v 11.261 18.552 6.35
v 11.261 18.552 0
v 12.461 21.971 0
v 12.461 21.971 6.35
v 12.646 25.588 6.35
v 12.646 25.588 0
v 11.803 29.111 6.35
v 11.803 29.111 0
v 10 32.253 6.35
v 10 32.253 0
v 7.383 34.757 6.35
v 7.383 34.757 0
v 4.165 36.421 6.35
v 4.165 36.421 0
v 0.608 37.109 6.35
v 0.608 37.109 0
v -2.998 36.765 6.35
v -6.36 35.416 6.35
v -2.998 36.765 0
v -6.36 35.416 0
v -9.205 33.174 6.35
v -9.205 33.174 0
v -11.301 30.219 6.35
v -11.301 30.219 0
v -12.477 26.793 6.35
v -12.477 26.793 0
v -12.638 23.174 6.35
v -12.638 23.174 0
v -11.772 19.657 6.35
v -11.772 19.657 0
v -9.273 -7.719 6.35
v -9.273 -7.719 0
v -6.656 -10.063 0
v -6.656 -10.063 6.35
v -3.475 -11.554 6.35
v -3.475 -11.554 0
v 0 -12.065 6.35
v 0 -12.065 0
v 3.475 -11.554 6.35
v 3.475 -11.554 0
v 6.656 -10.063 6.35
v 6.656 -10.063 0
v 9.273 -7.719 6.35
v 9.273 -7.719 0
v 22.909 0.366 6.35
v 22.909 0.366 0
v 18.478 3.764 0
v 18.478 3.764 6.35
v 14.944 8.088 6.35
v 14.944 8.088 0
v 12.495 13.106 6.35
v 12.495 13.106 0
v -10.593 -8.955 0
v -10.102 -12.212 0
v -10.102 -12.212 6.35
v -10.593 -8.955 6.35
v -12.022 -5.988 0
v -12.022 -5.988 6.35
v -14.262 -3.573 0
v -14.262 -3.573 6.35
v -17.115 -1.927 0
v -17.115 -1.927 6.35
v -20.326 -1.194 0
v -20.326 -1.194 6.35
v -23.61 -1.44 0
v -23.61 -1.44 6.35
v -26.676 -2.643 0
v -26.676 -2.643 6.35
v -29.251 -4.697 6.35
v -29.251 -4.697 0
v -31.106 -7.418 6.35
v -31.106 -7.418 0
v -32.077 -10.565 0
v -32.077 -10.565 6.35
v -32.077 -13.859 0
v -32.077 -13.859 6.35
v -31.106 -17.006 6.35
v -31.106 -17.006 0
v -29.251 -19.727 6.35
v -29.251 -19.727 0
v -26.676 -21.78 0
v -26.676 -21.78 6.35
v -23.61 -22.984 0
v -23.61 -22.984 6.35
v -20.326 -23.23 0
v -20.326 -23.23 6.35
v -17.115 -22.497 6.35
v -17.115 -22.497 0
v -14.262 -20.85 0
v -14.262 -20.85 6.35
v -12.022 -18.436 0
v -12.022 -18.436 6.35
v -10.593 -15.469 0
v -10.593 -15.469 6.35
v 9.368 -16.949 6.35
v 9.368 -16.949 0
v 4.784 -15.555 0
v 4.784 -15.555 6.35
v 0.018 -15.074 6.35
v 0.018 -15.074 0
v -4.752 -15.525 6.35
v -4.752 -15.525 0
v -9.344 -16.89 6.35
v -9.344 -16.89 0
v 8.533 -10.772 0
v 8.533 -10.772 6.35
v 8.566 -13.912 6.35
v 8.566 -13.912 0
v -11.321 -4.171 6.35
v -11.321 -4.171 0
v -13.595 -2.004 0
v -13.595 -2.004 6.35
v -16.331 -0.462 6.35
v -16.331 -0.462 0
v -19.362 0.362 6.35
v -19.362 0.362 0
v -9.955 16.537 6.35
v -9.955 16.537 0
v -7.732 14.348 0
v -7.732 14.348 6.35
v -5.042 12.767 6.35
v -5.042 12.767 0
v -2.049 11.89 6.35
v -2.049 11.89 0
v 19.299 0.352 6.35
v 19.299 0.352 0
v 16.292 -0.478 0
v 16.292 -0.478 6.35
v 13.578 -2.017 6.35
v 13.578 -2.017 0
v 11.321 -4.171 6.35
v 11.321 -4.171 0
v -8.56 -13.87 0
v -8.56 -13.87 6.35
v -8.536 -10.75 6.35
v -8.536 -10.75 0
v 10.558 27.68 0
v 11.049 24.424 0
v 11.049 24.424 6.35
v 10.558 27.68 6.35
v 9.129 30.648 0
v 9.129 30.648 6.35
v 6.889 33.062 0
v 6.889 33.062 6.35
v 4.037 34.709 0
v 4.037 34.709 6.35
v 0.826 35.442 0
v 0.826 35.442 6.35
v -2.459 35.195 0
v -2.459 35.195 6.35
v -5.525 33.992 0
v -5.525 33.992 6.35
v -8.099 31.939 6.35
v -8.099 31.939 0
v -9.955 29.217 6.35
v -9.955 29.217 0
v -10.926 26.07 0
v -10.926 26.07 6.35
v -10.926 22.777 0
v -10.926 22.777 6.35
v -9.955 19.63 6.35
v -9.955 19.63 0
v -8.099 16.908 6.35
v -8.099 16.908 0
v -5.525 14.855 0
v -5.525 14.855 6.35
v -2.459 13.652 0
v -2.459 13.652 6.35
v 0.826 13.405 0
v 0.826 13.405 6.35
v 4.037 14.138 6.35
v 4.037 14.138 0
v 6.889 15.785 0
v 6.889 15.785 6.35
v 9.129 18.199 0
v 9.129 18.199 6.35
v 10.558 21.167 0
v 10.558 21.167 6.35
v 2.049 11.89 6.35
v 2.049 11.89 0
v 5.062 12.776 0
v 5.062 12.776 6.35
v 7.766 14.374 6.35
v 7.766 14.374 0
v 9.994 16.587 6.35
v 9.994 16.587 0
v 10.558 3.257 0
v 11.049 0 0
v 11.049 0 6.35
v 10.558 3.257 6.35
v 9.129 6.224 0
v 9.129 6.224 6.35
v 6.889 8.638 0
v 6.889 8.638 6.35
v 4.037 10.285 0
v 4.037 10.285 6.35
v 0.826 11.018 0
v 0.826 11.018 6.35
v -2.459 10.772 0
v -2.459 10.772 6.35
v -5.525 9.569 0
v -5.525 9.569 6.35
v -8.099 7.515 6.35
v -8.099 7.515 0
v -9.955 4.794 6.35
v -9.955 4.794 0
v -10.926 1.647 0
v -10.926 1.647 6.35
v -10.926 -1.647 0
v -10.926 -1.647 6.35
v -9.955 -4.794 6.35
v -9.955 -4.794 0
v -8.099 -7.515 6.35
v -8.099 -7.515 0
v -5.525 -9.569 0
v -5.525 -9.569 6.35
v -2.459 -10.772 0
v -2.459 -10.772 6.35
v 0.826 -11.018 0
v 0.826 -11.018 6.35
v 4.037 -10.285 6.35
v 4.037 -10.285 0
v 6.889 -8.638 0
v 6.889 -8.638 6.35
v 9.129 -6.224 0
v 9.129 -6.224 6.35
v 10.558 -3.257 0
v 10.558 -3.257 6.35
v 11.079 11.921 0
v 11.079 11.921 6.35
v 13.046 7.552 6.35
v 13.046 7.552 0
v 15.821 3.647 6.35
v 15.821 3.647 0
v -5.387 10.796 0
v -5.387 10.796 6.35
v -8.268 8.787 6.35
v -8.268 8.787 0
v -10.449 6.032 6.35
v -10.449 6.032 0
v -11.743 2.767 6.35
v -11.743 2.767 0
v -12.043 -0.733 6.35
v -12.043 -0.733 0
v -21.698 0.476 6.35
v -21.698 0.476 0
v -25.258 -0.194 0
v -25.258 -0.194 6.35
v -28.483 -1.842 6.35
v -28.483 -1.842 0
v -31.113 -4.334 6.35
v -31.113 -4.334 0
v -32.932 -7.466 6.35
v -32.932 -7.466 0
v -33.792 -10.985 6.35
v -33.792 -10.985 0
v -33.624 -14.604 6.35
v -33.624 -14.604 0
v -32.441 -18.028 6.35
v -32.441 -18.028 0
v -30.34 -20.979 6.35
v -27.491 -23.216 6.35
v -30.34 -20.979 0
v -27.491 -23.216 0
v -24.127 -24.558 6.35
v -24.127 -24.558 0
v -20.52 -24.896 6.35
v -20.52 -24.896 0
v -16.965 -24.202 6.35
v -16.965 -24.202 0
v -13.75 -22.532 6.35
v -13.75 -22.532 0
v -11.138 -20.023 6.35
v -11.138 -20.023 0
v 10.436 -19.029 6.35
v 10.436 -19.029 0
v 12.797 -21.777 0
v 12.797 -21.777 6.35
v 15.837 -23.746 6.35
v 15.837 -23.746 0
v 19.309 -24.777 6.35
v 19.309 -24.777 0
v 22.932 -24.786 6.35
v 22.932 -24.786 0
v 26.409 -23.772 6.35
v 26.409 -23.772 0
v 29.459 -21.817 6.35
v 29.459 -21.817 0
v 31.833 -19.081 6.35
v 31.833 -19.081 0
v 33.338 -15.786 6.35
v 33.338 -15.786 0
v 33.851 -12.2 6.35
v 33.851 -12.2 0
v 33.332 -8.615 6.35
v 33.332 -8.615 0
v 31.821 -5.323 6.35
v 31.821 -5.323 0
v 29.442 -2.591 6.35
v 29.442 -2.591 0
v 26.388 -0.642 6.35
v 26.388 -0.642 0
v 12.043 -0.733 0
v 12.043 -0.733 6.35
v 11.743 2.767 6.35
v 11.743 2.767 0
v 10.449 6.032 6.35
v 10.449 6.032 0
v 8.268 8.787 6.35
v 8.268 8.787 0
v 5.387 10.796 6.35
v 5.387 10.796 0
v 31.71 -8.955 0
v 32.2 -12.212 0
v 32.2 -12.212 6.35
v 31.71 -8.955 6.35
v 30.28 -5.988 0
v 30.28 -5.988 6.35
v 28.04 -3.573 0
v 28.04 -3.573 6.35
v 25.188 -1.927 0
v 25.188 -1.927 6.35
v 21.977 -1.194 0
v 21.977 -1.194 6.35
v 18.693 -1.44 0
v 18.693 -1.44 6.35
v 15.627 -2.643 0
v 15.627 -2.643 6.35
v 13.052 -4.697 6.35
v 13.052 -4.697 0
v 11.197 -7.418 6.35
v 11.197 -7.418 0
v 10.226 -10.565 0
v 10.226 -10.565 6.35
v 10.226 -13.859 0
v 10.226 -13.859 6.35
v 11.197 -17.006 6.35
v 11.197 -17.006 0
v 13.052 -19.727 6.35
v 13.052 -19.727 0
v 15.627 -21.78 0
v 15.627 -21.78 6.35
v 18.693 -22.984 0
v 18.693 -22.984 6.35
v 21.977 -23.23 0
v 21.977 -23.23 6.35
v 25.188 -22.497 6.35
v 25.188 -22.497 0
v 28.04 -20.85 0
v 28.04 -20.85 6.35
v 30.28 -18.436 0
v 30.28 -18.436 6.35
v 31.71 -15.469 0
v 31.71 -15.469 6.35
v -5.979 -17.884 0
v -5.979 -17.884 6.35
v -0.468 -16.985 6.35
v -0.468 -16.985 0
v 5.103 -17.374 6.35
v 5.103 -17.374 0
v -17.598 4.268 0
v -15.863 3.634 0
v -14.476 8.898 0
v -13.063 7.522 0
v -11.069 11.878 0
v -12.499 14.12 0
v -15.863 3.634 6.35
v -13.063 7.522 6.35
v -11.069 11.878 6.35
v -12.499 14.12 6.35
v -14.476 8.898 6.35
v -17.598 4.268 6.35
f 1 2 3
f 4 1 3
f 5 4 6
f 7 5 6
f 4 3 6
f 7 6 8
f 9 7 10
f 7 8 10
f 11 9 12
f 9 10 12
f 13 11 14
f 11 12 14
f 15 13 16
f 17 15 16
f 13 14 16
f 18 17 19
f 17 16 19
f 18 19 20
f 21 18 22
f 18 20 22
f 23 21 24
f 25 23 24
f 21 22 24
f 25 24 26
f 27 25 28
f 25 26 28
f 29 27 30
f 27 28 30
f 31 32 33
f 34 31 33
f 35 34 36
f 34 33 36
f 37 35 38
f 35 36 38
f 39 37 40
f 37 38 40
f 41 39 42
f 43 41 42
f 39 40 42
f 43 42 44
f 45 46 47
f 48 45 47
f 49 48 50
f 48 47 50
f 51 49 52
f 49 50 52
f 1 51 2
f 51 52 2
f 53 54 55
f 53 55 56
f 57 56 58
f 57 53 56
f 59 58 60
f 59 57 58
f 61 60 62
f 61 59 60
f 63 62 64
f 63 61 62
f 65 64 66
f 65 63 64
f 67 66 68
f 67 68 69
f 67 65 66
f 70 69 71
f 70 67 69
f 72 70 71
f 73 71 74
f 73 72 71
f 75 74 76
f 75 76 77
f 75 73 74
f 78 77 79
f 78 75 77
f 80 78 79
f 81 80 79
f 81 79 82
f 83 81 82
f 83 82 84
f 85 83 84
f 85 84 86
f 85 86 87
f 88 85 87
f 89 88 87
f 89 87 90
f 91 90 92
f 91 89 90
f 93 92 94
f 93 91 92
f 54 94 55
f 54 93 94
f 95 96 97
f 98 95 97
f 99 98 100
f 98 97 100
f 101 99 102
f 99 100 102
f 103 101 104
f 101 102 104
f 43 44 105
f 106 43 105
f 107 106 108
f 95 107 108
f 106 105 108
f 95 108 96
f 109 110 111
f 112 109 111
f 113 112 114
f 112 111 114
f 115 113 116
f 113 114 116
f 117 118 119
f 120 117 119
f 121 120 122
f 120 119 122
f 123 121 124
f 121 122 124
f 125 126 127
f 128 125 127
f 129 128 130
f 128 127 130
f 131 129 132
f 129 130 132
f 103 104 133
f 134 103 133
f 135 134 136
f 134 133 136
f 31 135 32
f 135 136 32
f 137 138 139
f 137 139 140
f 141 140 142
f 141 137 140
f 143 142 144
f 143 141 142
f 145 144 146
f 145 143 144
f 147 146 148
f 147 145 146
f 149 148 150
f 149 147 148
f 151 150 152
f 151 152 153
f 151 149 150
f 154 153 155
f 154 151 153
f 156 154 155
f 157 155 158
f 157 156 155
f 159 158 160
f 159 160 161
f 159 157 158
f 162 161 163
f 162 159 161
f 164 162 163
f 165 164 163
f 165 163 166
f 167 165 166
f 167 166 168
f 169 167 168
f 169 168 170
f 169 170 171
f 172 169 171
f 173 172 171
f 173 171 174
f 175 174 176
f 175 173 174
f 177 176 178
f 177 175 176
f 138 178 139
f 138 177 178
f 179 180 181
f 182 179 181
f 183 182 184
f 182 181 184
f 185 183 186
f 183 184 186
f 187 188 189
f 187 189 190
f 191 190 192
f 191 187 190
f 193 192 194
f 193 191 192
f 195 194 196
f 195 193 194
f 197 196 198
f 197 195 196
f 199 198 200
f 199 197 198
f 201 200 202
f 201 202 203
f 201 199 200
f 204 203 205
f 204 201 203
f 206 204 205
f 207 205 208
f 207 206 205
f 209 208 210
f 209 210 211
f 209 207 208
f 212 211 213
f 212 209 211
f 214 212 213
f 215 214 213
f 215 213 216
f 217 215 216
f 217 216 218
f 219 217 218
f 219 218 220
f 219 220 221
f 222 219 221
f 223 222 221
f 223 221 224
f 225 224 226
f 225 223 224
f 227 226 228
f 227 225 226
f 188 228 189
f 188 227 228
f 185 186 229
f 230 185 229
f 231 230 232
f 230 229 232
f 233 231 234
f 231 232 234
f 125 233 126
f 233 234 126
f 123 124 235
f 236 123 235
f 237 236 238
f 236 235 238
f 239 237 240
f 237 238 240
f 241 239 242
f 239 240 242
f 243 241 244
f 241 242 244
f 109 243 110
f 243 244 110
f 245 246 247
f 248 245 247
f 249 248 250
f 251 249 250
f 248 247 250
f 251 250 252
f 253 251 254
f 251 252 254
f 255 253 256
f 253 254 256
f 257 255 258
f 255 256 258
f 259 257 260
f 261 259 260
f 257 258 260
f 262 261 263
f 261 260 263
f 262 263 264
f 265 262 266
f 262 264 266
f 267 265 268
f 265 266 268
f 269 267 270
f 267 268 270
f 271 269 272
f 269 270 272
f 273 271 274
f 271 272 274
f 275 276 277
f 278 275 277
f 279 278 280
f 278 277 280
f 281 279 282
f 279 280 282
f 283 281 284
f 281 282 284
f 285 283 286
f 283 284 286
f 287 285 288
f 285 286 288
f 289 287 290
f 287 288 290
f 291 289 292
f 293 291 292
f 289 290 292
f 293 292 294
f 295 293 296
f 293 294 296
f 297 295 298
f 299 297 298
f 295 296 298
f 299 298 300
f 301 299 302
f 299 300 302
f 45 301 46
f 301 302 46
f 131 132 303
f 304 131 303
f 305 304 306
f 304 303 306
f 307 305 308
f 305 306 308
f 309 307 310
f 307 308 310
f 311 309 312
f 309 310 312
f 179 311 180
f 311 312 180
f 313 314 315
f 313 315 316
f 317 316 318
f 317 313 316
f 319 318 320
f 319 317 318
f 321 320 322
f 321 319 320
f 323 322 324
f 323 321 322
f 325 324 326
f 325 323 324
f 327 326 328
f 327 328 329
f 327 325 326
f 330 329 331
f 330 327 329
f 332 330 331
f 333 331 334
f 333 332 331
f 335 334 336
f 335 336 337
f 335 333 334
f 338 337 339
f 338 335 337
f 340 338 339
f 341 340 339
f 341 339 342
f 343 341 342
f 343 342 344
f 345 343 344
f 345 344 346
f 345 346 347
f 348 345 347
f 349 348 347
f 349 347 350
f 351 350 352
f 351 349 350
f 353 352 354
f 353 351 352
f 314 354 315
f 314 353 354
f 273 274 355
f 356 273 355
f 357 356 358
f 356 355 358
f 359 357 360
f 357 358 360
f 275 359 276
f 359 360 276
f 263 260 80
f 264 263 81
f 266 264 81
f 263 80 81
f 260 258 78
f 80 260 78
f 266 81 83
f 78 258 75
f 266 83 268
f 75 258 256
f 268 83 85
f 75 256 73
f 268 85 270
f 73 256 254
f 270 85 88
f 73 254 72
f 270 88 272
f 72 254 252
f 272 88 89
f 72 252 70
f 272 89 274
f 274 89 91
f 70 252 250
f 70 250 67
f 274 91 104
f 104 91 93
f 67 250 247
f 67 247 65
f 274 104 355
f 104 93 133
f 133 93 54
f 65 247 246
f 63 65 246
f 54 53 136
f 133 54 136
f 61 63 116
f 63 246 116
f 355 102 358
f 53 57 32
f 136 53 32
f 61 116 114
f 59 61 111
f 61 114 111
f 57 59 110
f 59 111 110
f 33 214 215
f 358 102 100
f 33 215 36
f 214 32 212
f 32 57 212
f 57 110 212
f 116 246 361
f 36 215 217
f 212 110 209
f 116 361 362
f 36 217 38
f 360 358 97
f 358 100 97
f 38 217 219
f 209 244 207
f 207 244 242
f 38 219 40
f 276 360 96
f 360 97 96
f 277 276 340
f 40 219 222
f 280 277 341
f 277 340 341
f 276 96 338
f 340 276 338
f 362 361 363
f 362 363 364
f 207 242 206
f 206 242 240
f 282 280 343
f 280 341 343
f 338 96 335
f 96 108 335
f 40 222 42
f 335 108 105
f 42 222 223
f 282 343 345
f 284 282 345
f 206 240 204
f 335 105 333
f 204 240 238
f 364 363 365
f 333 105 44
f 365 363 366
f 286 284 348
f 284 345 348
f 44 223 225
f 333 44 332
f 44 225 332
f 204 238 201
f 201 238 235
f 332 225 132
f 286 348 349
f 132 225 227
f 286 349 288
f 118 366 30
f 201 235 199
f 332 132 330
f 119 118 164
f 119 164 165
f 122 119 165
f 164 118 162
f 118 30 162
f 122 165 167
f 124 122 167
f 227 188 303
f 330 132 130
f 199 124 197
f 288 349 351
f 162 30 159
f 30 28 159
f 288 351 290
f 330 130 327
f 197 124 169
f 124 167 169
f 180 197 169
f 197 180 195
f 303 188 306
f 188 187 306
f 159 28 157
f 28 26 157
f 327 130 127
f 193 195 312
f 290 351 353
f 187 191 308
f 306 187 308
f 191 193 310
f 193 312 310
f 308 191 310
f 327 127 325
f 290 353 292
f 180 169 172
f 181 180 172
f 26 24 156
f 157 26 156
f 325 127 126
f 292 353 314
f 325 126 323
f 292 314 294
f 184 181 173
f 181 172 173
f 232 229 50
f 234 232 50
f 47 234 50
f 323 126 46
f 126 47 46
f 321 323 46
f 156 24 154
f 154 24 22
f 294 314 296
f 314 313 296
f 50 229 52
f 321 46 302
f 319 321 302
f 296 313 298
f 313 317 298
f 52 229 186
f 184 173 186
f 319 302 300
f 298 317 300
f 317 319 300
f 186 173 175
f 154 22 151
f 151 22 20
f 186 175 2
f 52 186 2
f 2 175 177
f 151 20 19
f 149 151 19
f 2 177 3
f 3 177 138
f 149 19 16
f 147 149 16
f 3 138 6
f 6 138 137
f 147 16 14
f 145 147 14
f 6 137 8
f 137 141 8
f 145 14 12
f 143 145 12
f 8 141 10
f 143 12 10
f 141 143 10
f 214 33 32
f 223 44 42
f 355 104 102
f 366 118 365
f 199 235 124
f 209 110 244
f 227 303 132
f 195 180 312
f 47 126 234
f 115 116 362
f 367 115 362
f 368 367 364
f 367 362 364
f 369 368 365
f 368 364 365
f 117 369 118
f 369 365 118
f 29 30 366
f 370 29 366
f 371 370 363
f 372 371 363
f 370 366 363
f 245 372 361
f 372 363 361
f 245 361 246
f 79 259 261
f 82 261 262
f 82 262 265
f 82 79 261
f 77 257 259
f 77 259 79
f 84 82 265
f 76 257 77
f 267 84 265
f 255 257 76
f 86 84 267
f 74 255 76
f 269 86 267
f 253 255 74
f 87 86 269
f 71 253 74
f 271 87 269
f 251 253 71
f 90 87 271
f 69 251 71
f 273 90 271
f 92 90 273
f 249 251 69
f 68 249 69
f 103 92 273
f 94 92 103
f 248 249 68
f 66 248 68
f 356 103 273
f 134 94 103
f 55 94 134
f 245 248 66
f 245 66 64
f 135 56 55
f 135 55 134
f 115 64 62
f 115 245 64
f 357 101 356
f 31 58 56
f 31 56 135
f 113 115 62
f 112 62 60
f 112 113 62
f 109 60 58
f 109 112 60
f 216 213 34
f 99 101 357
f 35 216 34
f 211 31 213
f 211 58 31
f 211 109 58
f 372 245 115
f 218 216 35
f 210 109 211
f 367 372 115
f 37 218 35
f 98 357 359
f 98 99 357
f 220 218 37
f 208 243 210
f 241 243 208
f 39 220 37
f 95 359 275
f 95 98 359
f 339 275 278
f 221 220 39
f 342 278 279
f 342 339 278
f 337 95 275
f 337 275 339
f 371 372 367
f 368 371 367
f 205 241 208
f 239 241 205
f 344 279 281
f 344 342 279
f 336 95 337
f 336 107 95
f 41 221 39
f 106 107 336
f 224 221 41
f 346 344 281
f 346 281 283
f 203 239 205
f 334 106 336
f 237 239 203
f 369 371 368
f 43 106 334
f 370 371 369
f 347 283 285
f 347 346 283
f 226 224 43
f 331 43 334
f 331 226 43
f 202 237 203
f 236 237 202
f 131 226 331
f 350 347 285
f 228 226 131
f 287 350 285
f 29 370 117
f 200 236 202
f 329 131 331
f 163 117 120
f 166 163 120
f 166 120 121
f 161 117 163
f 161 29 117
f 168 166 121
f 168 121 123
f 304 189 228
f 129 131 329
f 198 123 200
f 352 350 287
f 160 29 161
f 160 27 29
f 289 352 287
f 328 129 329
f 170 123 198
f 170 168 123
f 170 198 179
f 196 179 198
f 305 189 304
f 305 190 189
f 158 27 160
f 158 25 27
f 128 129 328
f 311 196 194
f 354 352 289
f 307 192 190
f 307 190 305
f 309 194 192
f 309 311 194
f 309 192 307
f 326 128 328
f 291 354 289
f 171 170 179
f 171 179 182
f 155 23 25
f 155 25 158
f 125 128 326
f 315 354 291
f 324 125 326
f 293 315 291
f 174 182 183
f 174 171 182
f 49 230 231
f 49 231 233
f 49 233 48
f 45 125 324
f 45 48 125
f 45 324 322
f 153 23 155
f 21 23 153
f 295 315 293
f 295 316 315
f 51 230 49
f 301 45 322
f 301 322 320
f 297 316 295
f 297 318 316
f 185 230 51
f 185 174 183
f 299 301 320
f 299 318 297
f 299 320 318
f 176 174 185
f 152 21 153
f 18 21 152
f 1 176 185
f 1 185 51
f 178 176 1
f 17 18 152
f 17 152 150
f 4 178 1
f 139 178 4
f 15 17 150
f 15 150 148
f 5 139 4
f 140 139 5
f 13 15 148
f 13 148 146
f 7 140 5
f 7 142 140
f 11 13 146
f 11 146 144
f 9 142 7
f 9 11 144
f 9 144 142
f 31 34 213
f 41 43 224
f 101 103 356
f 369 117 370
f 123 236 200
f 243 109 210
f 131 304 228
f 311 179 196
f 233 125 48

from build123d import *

# Parameters (mm, degrees)
F0_R     = 11.049
F1_DEPTH = 6.35


with BuildPart() as f1:
    # F0 (on Top) → F1 (new body)
    with BuildSketch(Plane.XY):
        with BuildLine():
            ThreePointArc((-11.771514, 19.656815), (-14.475948, 8.897779), (-21.697628, 0.476489))
            ThreePointArc((-21.697628, 0.476489), (-32.441402, -18.027731), (-11.137544, -20.022838))
            ThreePointArc((-11.137544, -20.022838), (-0.467729, -16.985428), (10.436163, -19.028942))
            ThreePointArc((10.436163, -19.028942), (31.833175, -19.081213), (22.909058, 0.366023))
            ThreePointArc((22.909058, 0.366023), (14.943677, 8.087649), (11.261466, 18.552453))
            ThreePointArc((11.261466, 18.552453), (0.608228, 37.108944), (-11.771514, 19.656815))
        make_face()
        with Locations((-21.151386, -12.211759)):
            Circle(F0_R, mode=Mode.SUBTRACT)
        with BuildLine():
            ThreePointArc((-9.272628, -7.718977), (0, -12.065), (9.272628, -7.718977))
            ThreePointArc((9.272628, -7.718977), (8.452064, -12.342974), (9.367997, -16.949029))
            ThreePointArc((9.367997, -16.949029), (0.017693, -15.074095), (-9.344314, -16.889691))
            ThreePointArc((-9.344314, -16.889691), (-8.451774, -12.31103), (-9.272628, -7.718977))
        make_face(mode=Mode.SUBTRACT)
        with Locations((21.151386, -12.211759)):
            Circle(F0_R, mode=Mode.SUBTRACT)
        Circle(F0_R, mode=Mode.SUBTRACT)
        with BuildLine():
            ThreePointArc((-9.954744, 16.537259), (-6.435778, 13.474967), (-2.048516, 11.889819))
            ThreePointArc((-2.048516, 11.889819), (-10.448596, 6.0325), (-11.321144, -4.170843))
            ThreePointArc((-11.321144, -4.170843), (-14.915361, -1.148215), (-19.362288, 0.361591))
            ThreePointArc((-19.362288, 0.361591), (-13.063396, 7.521725), (-9.954744, 16.537259))
        make_face(mode=Mode.SUBTRACT)
        with BuildLine():
            ThreePointArc((11.321144, -4.170843), (10.448596, 6.0325), (2.048516, 11.889819))
            ThreePointArc((2.048516, 11.889819), (6.463297, 13.491189), (9.994291, 16.587438))
            ThreePointArc((9.994291, 16.587438), (13.045703, 7.55237), (19.299058, 0.352432))
            ThreePointArc((19.299058, 0.352432), (14.887552, -1.163936), (11.321144, -4.170843))
        make_face(mode=Mode.SUBTRACT)
        with Locations((0, 24.423517)):
            Circle(F0_R, mode=Mode.SUBTRACT)
    extrude(amount=F1_DEPTH)


solid = f1.part
